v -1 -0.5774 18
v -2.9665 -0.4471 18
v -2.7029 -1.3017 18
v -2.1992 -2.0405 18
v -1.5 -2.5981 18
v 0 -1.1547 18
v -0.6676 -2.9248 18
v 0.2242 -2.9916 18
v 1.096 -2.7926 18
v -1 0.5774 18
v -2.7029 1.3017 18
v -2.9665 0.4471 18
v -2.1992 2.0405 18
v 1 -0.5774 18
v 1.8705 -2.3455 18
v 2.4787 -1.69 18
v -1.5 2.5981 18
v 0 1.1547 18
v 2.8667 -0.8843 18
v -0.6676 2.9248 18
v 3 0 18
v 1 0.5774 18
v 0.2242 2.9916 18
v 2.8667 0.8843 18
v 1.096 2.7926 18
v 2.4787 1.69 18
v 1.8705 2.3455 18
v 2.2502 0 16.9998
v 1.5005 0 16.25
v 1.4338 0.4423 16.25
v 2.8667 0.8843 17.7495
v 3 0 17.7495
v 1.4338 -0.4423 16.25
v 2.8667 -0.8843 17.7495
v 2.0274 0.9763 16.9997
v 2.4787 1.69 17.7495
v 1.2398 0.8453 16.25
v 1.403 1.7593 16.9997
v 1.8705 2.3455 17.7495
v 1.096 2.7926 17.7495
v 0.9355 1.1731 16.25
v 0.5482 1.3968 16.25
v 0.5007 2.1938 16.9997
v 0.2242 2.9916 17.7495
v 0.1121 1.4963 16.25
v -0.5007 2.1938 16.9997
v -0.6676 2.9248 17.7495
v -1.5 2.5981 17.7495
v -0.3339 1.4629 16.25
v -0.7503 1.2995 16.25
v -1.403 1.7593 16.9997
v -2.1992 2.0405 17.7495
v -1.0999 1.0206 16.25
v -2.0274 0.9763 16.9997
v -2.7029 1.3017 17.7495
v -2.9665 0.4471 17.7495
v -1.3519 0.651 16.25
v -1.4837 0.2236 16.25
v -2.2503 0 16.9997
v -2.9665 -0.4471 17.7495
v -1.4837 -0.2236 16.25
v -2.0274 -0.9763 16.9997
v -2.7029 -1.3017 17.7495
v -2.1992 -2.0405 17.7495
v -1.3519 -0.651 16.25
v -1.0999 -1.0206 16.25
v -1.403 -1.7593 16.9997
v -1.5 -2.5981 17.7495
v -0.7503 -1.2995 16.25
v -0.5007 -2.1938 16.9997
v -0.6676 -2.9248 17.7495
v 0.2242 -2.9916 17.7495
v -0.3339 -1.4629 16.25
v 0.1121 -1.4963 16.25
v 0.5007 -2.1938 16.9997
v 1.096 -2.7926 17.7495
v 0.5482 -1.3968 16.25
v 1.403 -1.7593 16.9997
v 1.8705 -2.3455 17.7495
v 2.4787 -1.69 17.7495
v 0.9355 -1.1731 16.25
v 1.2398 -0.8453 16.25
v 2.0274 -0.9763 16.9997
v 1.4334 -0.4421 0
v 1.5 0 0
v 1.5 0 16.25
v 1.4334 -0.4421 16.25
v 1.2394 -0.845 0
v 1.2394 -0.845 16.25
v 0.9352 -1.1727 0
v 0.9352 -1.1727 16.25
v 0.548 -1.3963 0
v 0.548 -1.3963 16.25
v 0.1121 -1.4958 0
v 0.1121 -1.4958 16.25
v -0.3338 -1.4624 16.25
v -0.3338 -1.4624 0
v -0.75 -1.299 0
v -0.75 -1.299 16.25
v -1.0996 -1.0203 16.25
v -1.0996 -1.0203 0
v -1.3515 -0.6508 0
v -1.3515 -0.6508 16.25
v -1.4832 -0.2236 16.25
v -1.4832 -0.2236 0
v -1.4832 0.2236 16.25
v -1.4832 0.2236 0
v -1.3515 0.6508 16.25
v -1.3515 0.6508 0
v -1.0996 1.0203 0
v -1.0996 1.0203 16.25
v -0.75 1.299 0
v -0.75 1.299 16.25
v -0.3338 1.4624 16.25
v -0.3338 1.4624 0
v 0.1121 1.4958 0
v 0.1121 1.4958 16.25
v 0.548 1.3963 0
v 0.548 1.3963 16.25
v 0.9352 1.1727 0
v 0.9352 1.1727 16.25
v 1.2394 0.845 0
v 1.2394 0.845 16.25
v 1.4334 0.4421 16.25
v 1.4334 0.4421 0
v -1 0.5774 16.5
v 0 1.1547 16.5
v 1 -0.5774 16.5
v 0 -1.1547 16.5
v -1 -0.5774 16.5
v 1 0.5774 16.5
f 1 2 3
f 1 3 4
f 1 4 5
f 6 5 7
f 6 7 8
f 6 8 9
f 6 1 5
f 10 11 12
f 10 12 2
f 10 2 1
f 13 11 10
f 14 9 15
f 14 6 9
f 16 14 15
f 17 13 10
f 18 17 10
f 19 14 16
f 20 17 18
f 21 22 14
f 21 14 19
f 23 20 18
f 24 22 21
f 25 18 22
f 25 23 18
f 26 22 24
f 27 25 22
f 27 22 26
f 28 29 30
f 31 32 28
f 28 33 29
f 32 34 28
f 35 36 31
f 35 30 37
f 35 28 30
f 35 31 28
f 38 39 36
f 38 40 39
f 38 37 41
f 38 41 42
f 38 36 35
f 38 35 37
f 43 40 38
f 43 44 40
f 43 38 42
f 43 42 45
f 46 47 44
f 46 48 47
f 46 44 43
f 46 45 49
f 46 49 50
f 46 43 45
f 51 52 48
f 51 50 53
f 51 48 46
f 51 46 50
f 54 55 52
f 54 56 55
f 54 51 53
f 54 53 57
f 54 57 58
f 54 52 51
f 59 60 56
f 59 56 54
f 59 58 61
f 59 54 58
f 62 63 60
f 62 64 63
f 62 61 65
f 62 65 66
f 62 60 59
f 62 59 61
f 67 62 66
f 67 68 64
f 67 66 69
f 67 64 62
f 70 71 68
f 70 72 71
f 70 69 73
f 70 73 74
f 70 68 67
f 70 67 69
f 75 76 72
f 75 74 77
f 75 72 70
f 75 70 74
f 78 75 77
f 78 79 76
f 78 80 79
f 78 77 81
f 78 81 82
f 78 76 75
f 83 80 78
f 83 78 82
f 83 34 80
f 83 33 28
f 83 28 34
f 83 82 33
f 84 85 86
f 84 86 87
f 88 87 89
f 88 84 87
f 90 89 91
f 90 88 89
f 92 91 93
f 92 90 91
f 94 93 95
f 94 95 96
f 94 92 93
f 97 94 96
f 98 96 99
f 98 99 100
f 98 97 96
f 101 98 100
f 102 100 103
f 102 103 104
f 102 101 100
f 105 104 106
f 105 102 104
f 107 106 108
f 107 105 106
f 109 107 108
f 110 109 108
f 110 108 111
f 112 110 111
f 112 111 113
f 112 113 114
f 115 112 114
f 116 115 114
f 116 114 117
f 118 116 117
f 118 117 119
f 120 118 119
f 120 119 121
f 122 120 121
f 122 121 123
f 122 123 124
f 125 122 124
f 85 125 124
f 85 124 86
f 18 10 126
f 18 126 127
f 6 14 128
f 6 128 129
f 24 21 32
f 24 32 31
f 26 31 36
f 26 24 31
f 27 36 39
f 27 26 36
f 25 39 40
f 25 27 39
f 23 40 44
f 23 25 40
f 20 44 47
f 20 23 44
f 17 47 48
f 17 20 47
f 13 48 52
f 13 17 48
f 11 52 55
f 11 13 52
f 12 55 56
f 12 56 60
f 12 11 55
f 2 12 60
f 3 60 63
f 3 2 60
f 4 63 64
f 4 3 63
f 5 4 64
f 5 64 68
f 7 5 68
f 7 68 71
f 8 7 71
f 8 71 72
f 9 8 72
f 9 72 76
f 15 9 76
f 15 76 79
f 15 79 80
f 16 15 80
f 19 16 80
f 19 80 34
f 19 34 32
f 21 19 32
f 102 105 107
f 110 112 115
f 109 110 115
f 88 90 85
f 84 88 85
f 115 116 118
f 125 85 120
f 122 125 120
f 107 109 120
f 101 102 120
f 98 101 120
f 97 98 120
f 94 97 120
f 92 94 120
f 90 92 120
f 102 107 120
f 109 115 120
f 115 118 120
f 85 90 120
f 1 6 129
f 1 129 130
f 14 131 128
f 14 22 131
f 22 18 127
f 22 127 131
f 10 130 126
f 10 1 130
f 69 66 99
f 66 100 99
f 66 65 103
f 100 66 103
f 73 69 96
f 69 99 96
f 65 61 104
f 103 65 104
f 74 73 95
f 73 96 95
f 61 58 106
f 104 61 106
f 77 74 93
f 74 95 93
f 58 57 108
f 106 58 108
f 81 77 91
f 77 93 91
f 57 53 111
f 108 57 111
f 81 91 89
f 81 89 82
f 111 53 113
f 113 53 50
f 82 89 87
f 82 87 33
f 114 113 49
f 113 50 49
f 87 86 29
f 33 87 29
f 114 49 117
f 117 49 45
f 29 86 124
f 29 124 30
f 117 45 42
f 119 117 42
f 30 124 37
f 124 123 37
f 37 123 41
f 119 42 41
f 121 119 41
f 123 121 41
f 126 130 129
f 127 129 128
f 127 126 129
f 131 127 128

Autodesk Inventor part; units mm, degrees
ref_plane "YZ Plane" through (0, 0, 0) normal (1, 0, 0) x (0, 1, 0)
ref_plane "XZ Plane" through (0, 0, 0) normal (0, 1, 0) x (-1, 0, 0)
ref_plane "XY Plane" through (0, 0, 0) normal (0, 0, 1) x (1, 0, 0)
sketch "スケッチ1" plane through (0, 0, 0) normal (0, 0, 1) x (1, 0, 0)
  circle A0 centre (0, 0) radius 1.5
  dimension "d0" = 3
extrude "押し出し1" add sketch "スケッチ1" along normal blind 18
thread "ねじ1" size "M3x0.5" class "6g" standard "ANSI Metric M Profile" full length
sketch "スケッチ2" plane through (0, 0, 18) normal (0, 0, 1) x (1, 0, 0)
  circle A0 centre (0, 0) radius 3
  dimension "d5" = 6
extrude "押し出し2" add sketch "スケッチ2" against normal blind 1.75
chamfer "面取り1" distance 1.5 angle 45 1 edges at (-3, 0, 16.25)
sketch "スケッチ3" plane through (0, 0, 18) normal (0, 0, 1) x (1, 0, 0)
  line L0 (0, 1.1547) -> (1, 0.5774)
  line L1 (1, 0.5774) -> (1, -0.5774)
  line L2 (1, -0.5774) -> (0, -1.1547)
  line L3 (0, -1.1547) -> (-1, -0.5774)
  line L4 (-1, -0.5774) -> (-1, 0.5774)
  line L5 (-1, 0.5774) -> (0, 1.1547)
  point P0 (0, 0)
  point P1 (0, 0)
  dimension "d11" = 2
extrude "押し出し3" cut sketch "スケッチ3" against normal blind 1.5
properties part number "m3皿ネジ18 (1)" material "鉄 灰色"
